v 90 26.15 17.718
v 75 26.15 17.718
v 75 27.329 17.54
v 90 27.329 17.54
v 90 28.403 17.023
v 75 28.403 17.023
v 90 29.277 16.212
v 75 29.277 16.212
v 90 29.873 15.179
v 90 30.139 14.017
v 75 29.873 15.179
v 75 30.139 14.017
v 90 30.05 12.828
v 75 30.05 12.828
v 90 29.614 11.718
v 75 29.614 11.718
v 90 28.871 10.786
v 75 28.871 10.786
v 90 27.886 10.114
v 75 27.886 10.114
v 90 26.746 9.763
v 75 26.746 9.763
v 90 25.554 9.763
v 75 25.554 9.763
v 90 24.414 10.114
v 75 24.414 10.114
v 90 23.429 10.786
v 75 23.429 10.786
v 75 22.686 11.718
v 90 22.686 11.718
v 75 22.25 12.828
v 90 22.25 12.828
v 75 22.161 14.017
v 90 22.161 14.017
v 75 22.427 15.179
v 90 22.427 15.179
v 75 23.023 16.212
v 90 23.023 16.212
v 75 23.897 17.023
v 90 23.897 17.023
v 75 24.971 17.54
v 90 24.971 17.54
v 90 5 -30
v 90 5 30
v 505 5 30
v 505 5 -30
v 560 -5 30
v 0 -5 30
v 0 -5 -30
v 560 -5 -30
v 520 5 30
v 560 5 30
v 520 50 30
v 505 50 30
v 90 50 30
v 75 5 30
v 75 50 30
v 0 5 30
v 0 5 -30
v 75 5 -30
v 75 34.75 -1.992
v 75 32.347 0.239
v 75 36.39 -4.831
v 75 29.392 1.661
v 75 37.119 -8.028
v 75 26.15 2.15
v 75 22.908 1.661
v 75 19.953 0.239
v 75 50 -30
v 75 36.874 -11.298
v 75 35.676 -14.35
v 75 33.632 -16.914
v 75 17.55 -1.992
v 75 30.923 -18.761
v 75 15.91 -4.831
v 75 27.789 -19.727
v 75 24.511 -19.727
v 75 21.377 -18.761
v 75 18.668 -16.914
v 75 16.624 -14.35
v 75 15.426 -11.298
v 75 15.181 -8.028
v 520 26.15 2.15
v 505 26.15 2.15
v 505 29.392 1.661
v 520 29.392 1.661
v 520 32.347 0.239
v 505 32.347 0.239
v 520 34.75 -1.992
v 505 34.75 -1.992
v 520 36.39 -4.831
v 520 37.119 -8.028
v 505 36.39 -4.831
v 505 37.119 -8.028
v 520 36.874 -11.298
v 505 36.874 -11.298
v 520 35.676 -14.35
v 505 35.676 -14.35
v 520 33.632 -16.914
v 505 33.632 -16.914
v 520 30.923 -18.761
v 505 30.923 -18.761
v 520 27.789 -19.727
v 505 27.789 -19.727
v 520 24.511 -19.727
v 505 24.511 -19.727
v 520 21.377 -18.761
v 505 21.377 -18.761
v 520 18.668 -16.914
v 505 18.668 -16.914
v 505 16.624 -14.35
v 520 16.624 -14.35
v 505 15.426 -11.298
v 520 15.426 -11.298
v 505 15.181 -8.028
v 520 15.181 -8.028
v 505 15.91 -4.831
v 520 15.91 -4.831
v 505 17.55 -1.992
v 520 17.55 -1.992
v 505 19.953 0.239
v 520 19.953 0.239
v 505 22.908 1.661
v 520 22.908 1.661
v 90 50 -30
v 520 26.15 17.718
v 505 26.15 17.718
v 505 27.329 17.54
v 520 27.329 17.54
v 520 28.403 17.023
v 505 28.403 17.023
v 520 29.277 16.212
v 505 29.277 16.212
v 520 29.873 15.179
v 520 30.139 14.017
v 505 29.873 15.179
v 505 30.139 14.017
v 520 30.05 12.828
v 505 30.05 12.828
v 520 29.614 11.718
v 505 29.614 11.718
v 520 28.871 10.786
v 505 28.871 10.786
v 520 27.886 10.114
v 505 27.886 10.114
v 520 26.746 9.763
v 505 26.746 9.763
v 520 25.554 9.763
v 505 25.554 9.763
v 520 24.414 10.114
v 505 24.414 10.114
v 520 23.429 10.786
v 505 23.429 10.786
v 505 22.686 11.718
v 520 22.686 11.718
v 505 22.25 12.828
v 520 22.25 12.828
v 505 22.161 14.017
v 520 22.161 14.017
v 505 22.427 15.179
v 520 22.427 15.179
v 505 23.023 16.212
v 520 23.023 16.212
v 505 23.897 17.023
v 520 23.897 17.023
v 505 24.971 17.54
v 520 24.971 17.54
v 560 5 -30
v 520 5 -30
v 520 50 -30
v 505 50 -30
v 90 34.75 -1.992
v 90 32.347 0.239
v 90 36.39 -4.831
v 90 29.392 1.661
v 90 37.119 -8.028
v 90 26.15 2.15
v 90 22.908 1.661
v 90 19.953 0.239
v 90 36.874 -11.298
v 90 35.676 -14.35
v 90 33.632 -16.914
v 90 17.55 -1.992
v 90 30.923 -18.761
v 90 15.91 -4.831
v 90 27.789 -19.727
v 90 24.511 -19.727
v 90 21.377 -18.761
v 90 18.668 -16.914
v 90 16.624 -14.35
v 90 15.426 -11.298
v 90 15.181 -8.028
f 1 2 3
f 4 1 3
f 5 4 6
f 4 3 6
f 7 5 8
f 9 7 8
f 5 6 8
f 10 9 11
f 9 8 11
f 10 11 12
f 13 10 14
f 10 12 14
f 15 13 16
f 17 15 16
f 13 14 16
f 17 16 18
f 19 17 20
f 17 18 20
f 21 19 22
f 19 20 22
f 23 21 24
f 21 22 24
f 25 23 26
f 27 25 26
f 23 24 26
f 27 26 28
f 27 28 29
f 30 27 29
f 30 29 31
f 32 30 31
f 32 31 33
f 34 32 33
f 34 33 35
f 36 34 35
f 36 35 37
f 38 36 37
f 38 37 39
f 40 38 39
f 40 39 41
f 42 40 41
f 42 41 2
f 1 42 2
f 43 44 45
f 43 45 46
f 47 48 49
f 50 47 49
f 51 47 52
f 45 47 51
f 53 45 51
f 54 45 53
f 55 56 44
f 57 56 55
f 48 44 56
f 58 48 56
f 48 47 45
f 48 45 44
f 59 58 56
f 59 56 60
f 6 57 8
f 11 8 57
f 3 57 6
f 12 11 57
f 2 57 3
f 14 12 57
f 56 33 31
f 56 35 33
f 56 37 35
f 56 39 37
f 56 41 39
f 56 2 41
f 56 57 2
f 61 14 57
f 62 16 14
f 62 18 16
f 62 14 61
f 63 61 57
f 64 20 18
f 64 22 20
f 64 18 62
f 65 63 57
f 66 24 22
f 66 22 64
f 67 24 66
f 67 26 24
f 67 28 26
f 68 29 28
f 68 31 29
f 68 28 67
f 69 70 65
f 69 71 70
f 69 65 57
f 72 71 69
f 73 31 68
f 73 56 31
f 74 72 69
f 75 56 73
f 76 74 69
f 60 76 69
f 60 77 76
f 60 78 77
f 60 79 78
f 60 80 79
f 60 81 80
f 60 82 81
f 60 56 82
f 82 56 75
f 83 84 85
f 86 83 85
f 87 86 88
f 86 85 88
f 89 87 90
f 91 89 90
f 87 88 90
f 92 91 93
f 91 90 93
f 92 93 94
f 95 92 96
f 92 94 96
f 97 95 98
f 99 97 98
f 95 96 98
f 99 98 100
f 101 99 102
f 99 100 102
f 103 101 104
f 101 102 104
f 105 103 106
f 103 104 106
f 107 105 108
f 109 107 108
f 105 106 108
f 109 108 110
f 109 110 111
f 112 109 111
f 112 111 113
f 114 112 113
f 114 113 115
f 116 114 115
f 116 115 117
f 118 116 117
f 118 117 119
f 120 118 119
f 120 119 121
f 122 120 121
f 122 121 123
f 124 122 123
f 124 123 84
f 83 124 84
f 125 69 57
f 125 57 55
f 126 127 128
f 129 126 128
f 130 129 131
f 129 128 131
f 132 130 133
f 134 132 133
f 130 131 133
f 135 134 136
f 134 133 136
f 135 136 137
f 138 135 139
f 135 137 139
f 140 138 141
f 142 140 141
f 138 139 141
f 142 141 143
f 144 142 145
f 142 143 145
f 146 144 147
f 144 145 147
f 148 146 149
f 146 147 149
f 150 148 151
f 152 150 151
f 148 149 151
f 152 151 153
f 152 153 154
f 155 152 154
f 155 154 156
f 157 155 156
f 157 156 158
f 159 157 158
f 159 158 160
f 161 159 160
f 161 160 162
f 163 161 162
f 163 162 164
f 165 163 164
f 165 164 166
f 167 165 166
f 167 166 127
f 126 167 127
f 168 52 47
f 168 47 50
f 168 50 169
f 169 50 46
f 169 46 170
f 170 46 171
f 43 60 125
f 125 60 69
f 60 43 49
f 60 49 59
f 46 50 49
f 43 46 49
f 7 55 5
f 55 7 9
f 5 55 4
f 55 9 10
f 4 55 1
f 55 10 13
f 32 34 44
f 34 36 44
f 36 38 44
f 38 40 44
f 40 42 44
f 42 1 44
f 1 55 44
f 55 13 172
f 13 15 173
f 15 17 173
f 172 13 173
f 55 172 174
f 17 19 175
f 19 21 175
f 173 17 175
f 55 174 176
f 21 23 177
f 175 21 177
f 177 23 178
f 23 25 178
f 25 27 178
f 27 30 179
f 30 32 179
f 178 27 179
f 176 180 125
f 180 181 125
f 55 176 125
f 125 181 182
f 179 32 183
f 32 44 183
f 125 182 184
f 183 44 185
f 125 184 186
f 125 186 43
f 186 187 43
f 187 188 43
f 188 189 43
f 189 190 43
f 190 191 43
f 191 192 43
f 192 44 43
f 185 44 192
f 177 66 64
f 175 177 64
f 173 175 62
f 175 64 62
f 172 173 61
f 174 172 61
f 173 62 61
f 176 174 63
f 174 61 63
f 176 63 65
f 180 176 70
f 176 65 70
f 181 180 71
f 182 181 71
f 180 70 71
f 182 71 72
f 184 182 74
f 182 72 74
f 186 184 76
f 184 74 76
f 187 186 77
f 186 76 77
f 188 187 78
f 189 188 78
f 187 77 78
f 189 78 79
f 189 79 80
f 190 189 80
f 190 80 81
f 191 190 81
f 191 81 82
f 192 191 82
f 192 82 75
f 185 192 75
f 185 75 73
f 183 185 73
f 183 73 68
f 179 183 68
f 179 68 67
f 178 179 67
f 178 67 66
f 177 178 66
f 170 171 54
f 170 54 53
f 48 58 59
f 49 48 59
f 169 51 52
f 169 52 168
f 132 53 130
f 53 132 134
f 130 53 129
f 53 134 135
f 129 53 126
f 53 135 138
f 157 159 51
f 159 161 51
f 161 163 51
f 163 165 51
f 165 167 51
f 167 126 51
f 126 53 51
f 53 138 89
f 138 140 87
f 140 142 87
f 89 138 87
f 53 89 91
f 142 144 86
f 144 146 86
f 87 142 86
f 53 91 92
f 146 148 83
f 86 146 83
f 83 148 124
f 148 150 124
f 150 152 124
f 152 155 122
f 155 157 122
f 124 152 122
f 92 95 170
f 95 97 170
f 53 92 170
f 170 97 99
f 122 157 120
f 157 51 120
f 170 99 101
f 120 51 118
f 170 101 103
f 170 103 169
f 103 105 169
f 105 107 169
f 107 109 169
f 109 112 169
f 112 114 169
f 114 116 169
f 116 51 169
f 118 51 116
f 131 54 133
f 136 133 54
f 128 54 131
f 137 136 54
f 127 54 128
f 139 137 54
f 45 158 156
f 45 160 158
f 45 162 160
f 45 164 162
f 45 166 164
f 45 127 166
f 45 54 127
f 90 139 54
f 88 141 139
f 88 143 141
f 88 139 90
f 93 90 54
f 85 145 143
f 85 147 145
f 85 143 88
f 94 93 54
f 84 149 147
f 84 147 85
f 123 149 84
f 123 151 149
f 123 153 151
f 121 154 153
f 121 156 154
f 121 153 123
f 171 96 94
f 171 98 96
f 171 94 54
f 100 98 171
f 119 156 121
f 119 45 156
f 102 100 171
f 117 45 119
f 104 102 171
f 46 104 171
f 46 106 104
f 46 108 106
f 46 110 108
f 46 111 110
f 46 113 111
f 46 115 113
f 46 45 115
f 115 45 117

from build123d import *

# Parameters (mm, degrees)
SKETCH2_W           = 60
SKETCH2_H           = 10
BOSS_EXTRUDE1_DEPTH = 560
SKETCH4_W           = 15
SKETCH4_H           = 60
BOSS_EXTRUDE2_DEPTH = 45
SKETCH5_W           = 15
SKETCH5_H           = 60
BOSS_EXTRUDE3_DEPTH = 45
SKETCH6_R           = 11
SKETCH6_R_2         = 4
CUT_EXTRUDE1_DEPTH  = 455


with BuildPart() as part:
    # Sketch2 → Boss-Extrude1 (new body)
    with BuildSketch(Plane(origin=(0, 0, 0), x_dir=(0, 0, -1), z_dir=(1, 0, 0))):
        Rectangle(SKETCH2_W, SKETCH2_H)
    extrude(amount=BOSS_EXTRUDE1_DEPTH)

    # Sketch4 → Boss-Extrude2 (add)
    with BuildSketch(Plane(origin=(0, 5, 0), x_dir=(1, 0, 0), z_dir=(0, 1, 0))):
        with Locations((82.5, 0)):
            Rectangle(SKETCH4_W, SKETCH4_H)
    extrude(amount=BOSS_EXTRUDE2_DEPTH)

    # Sketch5 → Boss-Extrude3 (add)
    with BuildSketch(Plane(origin=(0, 5, 0), x_dir=(1, 0, 0), z_dir=(0, 1, 0))):
        with Locations((512.5, 0)):
            Rectangle(SKETCH5_W, SKETCH5_H)
    extrude(amount=BOSS_EXTRUDE3_DEPTH)

    # Sketch6 → Cut-Extrude1 (cut)
    with BuildSketch(Plane.ZY.offset(-75)):
        with Locations((-8.85, 26.15)):
            Circle(SKETCH6_R)
        with Locations((13.717950956, 26.15)):
            Circle(SKETCH6_R_2)
    extrude(amount=-CUT_EXTRUDE1_DEPTH, mode=Mode.SUBTRACT)


solid = part.part
